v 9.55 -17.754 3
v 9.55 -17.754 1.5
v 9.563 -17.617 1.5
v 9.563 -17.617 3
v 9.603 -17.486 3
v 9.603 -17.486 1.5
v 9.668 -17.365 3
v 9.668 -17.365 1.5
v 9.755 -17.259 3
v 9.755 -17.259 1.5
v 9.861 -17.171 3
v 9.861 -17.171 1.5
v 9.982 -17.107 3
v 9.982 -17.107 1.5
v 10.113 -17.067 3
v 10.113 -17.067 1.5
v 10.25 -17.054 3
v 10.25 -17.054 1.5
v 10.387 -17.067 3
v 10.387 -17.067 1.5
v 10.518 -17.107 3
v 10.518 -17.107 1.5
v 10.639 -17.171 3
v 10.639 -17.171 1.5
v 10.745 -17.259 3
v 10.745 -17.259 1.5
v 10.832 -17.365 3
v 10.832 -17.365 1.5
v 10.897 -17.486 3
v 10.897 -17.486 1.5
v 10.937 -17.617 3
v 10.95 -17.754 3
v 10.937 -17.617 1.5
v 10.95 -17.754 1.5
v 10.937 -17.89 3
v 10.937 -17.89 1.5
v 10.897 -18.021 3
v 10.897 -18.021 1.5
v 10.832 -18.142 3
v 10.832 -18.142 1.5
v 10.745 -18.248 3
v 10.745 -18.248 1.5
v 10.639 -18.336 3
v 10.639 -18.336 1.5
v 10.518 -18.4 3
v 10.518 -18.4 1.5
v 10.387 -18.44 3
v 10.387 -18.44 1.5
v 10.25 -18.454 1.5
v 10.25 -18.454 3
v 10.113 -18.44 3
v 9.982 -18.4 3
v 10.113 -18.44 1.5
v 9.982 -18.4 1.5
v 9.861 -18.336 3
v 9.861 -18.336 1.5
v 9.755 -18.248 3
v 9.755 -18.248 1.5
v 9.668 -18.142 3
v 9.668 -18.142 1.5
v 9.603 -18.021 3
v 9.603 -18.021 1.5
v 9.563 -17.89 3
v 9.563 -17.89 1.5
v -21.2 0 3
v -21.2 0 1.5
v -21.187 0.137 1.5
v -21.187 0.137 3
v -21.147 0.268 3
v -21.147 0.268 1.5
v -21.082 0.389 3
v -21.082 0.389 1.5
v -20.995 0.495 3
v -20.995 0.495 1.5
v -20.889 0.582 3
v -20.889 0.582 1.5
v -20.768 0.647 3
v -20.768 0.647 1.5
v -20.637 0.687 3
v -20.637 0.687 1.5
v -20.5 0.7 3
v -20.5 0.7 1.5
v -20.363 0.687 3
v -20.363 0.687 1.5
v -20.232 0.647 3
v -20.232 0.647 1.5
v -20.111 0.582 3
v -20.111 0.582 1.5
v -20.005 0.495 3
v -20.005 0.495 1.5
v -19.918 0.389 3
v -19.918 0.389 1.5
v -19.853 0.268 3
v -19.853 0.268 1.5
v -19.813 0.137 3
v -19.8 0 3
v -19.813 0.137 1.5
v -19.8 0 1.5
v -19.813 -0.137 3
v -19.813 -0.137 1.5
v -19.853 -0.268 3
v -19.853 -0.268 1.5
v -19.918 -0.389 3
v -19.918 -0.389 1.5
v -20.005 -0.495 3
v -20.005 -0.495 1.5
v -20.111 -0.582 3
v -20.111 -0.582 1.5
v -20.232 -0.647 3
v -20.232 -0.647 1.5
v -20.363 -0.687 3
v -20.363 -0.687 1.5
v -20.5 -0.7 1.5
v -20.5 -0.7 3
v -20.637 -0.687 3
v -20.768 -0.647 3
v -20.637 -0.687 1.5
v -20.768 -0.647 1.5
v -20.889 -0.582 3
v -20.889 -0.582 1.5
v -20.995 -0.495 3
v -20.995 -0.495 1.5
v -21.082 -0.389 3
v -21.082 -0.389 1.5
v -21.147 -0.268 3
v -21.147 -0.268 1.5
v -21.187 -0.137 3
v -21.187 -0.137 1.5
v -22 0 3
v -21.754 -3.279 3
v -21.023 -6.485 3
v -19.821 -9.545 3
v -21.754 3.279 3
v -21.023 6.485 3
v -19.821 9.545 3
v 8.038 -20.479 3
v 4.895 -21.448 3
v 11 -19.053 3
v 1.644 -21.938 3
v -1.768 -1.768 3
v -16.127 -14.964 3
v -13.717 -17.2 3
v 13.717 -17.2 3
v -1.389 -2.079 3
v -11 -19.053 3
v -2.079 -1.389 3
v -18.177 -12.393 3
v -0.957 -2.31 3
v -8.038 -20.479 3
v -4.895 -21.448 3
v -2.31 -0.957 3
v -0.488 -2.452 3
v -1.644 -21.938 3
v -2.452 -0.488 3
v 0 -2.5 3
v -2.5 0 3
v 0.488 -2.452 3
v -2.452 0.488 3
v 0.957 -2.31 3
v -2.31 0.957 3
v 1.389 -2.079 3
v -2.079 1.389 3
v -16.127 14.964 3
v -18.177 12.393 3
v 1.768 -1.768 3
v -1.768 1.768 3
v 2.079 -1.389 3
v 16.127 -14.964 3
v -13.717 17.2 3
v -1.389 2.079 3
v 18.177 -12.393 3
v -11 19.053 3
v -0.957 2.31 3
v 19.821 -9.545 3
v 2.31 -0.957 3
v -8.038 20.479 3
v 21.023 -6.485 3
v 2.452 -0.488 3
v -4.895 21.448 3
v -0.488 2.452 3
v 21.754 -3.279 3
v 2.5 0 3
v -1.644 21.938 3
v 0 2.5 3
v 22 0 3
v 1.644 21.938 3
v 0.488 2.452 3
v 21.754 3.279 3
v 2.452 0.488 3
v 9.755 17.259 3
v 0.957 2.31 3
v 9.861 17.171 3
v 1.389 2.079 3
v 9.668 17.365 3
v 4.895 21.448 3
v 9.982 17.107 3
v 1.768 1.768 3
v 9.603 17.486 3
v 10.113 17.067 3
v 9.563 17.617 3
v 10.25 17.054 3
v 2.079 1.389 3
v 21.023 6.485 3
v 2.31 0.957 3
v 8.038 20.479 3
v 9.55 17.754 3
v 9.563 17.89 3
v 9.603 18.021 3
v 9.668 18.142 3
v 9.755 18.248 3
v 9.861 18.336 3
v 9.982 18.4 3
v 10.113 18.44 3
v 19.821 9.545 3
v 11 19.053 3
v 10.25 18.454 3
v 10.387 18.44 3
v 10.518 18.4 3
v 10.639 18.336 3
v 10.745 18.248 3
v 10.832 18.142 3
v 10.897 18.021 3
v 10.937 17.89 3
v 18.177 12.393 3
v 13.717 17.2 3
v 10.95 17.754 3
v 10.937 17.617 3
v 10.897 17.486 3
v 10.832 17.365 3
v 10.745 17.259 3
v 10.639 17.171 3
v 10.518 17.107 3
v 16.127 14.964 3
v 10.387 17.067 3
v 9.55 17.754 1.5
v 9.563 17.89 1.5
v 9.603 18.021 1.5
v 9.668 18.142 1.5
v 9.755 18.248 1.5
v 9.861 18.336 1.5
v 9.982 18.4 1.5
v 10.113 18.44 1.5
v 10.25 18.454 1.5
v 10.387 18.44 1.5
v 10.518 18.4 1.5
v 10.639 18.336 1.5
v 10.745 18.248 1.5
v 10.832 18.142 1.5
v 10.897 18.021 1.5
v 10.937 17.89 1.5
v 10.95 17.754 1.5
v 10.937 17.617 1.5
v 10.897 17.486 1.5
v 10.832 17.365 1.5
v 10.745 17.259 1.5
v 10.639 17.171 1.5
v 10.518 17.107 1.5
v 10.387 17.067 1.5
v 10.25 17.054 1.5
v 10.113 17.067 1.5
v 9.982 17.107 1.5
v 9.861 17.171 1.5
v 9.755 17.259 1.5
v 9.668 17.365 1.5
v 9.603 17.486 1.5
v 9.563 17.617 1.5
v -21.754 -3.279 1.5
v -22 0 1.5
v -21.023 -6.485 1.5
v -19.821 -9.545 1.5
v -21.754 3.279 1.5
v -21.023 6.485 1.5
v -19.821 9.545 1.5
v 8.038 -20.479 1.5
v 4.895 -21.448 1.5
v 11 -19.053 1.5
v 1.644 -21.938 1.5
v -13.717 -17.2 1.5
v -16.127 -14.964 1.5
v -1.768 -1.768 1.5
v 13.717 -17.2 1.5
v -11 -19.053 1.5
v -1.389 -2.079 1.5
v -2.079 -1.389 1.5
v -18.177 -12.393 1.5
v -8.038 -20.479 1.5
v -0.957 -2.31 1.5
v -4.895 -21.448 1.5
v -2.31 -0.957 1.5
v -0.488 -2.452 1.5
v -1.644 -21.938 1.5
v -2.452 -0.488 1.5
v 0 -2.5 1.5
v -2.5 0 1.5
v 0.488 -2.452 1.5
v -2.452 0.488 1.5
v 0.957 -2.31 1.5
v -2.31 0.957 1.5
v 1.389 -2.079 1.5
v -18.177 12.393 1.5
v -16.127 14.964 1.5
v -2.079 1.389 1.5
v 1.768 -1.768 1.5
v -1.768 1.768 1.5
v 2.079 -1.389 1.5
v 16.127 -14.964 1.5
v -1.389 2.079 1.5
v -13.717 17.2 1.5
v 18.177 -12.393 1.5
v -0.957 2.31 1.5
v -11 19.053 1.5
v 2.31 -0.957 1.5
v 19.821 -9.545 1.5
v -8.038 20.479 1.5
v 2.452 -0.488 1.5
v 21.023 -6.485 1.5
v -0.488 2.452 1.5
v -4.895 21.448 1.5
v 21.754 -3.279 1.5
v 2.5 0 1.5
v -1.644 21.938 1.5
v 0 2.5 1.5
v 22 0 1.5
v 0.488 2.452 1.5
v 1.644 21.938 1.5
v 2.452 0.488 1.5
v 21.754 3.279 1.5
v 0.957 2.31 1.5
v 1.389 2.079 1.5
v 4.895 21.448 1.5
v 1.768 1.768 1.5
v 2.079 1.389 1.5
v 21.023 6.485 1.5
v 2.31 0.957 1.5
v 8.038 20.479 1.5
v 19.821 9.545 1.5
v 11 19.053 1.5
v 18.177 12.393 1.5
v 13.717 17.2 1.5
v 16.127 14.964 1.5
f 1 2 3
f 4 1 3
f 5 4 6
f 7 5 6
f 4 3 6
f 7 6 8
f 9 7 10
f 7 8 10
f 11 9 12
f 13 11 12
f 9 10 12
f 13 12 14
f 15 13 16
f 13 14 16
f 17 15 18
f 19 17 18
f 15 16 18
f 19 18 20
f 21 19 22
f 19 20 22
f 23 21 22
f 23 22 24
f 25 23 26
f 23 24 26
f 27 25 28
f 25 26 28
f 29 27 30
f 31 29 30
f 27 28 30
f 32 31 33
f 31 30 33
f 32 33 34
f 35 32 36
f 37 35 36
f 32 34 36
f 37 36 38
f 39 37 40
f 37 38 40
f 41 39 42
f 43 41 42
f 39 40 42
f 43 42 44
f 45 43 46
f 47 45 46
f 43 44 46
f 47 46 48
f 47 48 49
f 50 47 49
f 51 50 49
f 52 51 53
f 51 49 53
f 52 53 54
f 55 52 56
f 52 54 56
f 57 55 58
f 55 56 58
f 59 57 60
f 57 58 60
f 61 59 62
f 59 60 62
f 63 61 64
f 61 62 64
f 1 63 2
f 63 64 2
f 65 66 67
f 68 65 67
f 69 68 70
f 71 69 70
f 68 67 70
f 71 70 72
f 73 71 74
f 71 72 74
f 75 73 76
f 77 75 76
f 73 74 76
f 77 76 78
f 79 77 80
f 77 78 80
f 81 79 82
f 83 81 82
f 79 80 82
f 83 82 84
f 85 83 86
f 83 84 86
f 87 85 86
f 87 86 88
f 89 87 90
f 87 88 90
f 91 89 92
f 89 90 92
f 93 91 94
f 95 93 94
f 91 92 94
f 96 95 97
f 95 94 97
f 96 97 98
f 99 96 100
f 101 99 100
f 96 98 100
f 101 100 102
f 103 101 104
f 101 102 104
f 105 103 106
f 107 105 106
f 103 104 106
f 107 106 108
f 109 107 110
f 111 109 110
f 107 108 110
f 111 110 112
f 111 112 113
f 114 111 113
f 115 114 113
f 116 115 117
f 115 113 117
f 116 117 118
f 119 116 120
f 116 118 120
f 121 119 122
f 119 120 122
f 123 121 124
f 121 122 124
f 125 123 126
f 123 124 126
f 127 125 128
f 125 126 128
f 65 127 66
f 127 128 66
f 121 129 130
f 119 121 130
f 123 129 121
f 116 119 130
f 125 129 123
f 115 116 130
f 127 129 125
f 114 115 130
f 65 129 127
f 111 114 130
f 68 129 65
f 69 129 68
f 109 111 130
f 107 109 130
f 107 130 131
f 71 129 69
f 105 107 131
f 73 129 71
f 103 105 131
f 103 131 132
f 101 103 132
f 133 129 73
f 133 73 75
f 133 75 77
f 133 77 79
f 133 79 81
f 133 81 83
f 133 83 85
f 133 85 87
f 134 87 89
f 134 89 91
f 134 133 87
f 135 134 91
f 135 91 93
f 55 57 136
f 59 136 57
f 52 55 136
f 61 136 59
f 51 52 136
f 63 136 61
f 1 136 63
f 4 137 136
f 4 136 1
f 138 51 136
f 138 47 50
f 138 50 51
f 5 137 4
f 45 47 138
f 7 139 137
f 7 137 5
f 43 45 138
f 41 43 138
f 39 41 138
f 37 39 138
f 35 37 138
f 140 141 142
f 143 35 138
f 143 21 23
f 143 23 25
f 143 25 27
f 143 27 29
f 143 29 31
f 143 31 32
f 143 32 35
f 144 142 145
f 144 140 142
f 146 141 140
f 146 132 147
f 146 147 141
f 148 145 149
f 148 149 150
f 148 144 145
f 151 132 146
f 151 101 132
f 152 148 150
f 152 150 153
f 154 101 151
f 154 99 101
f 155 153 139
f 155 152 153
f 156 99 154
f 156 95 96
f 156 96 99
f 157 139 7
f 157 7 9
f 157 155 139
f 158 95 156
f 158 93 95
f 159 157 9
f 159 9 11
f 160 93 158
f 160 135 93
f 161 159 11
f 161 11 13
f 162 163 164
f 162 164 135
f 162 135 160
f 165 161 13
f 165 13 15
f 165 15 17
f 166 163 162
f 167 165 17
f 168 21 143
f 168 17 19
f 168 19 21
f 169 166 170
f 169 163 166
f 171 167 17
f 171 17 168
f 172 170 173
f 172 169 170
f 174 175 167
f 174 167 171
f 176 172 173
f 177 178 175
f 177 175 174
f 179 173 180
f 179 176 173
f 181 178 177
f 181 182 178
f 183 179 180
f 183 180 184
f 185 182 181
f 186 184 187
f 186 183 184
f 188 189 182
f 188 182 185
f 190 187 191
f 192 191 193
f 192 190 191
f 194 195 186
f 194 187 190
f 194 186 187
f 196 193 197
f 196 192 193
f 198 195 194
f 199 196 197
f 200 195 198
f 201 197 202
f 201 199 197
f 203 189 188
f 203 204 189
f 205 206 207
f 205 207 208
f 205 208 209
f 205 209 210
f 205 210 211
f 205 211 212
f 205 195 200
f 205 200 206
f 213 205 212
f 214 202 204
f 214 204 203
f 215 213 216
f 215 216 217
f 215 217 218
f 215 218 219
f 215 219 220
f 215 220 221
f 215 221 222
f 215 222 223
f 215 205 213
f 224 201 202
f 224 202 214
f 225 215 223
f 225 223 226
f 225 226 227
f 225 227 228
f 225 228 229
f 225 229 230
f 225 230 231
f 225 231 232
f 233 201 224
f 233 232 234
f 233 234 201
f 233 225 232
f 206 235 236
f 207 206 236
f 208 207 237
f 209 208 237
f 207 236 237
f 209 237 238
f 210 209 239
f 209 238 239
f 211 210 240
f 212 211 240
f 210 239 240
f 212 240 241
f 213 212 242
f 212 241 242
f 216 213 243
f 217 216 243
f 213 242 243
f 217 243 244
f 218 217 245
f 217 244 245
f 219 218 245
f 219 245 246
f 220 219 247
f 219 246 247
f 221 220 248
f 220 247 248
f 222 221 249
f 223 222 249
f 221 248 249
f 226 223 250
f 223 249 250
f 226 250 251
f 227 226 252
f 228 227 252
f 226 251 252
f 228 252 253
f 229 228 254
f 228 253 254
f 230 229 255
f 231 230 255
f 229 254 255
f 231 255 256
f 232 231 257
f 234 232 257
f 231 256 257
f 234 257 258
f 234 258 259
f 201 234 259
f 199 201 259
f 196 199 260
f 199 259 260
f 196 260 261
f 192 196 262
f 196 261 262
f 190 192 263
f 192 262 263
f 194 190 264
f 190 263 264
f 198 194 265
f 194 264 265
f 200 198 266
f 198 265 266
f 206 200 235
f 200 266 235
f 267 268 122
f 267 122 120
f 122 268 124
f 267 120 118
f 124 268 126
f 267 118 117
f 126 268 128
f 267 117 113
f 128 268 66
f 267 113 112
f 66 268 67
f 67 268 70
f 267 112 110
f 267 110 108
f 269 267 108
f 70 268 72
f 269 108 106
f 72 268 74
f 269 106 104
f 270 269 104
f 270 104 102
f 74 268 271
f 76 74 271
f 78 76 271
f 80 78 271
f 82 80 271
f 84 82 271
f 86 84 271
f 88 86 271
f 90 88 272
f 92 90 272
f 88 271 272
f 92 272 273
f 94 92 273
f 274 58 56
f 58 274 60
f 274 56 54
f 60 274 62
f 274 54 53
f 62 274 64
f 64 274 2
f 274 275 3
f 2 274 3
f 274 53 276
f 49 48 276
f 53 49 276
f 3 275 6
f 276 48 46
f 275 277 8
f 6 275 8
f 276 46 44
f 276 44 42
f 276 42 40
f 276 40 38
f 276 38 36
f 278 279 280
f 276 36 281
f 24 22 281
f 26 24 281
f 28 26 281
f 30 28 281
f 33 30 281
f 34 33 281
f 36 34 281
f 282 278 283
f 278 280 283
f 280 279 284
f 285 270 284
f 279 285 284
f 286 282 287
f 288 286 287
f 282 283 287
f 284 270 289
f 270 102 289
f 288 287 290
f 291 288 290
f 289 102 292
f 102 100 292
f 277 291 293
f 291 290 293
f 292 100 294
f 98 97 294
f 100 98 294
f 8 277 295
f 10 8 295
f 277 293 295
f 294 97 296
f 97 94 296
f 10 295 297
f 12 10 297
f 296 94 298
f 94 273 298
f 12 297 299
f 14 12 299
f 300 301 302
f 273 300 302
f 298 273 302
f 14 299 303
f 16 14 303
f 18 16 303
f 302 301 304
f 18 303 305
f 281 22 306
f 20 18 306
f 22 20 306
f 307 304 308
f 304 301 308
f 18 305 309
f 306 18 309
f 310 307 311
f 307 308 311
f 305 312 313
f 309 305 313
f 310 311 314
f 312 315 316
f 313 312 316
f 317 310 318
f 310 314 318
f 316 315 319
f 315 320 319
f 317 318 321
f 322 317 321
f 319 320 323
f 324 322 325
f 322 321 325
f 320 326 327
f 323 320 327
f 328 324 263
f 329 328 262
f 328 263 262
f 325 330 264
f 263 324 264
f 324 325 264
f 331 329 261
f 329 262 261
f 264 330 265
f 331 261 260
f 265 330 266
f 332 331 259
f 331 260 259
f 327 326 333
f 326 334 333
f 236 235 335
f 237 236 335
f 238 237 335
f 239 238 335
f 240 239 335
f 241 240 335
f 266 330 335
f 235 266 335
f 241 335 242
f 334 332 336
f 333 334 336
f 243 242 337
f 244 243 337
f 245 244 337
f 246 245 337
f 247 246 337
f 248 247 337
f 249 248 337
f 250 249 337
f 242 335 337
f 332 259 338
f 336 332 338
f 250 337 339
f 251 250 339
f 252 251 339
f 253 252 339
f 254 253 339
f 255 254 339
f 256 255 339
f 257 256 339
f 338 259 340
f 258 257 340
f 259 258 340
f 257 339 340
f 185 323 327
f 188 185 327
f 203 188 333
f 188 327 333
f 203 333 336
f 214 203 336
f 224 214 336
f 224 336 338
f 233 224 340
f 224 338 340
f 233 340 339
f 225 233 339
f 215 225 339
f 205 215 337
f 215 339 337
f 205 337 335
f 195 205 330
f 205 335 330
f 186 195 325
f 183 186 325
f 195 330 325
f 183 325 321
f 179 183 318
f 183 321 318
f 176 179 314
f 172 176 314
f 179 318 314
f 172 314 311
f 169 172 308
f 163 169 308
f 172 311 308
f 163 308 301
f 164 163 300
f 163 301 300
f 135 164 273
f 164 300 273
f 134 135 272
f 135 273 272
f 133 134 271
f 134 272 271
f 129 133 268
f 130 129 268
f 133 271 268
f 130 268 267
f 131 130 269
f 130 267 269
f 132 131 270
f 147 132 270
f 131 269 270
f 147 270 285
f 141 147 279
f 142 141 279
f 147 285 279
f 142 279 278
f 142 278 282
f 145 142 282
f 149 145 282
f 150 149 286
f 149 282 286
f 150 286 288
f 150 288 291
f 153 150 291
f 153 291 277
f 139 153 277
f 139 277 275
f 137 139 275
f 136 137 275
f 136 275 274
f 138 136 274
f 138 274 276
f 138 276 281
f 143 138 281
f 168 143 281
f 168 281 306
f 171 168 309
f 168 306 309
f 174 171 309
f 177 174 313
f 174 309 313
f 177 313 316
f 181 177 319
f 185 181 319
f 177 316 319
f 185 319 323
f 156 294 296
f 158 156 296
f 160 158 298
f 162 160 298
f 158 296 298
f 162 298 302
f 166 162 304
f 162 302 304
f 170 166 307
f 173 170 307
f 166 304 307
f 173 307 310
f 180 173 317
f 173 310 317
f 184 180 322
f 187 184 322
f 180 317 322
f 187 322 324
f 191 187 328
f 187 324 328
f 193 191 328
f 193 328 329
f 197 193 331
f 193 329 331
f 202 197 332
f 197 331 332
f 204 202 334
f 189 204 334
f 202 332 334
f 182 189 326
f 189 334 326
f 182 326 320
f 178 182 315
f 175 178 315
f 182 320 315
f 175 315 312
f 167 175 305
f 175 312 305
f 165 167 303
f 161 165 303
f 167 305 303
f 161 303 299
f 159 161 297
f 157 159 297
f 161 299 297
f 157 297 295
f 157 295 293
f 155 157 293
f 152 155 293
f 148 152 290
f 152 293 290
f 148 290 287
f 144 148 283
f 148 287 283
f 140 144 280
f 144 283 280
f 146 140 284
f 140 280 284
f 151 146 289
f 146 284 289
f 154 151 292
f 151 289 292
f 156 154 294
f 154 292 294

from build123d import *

# Parameters (mm, degrees)
EXTRUDE_1_DEPTH     = 1.5
SKETCH_3_R          = 22
EXTRUDE_2_DEPTH     = 1.5
SKETCH_4_R          = 35.070526428
CUT_EXTRUDE_1_DEPTH = 1.5
SKETCH_5_R          = 0.7
CUT_EXTRUDE_2_DEPTH = 1.5
SKETCH_6_R          = 2.5
CUT_EXTRUDE_3_DEPTH = 1.5


with BuildPart() as part:
    # 草图2 → 凸台-拉伸1 (new body)
    with BuildSketch(Plane.XY):
        with BuildLine():
            Line((-6, -20.3), (6, -20.3))
            Line((6, -20.3), (7.479773249, -16.152182272))
            ThreePointArc((7.479773249, -16.152182272), (0, 17.8), (-7.479773249, -16.152182272))
            Line((-7.479773249, -16.152182272), (-6, -20.3))
        make_face()
    extrude(amount=EXTRUDE_1_DEPTH)

    # 草图3 → 凸台-拉伸2 (add)
    with BuildSketch(Plane.XY.offset(1.5)):
        Circle(SKETCH_3_R)
    extrude(amount=EXTRUDE_2_DEPTH)

    # 草图4 → 切除-拉伸1 (cut)
    with BuildSketch(Plane(origin=(0, 0, 0), x_dir=(-1, 0, 0), z_dir=(0, 0, -1))):
        Circle(SKETCH_4_R)
    extrude(amount=-CUT_EXTRUDE_1_DEPTH, mode=Mode.SUBTRACT)

    # 草图5 → 切除-拉伸2 (cut)
    with BuildSketch(Plane(origin=(0, 0, 1.5), x_dir=(-1, 0, 0), z_dir=(0, 0, -1))):
        with Locations((20.5, 0)):
            Circle(SKETCH_5_R)
        with Locations((-10.25, -17.753520778)):
            Circle(SKETCH_5_R)
        with Locations((-10.25, 17.753520778)):
            Circle(SKETCH_5_R)
    extrude(amount=-CUT_EXTRUDE_2_DEPTH, mode=Mode.SUBTRACT)

    # 草图6 → 切除-拉伸3 (cut)
    with BuildSketch(Plane(origin=(0, 0, 1.5), x_dir=(-1, 0, 0), z_dir=(0, 0, -1))):
        Circle(SKETCH_6_R)
    extrude(amount=-CUT_EXTRUDE_3_DEPTH, mode=Mode.SUBTRACT)


solid = part.part
